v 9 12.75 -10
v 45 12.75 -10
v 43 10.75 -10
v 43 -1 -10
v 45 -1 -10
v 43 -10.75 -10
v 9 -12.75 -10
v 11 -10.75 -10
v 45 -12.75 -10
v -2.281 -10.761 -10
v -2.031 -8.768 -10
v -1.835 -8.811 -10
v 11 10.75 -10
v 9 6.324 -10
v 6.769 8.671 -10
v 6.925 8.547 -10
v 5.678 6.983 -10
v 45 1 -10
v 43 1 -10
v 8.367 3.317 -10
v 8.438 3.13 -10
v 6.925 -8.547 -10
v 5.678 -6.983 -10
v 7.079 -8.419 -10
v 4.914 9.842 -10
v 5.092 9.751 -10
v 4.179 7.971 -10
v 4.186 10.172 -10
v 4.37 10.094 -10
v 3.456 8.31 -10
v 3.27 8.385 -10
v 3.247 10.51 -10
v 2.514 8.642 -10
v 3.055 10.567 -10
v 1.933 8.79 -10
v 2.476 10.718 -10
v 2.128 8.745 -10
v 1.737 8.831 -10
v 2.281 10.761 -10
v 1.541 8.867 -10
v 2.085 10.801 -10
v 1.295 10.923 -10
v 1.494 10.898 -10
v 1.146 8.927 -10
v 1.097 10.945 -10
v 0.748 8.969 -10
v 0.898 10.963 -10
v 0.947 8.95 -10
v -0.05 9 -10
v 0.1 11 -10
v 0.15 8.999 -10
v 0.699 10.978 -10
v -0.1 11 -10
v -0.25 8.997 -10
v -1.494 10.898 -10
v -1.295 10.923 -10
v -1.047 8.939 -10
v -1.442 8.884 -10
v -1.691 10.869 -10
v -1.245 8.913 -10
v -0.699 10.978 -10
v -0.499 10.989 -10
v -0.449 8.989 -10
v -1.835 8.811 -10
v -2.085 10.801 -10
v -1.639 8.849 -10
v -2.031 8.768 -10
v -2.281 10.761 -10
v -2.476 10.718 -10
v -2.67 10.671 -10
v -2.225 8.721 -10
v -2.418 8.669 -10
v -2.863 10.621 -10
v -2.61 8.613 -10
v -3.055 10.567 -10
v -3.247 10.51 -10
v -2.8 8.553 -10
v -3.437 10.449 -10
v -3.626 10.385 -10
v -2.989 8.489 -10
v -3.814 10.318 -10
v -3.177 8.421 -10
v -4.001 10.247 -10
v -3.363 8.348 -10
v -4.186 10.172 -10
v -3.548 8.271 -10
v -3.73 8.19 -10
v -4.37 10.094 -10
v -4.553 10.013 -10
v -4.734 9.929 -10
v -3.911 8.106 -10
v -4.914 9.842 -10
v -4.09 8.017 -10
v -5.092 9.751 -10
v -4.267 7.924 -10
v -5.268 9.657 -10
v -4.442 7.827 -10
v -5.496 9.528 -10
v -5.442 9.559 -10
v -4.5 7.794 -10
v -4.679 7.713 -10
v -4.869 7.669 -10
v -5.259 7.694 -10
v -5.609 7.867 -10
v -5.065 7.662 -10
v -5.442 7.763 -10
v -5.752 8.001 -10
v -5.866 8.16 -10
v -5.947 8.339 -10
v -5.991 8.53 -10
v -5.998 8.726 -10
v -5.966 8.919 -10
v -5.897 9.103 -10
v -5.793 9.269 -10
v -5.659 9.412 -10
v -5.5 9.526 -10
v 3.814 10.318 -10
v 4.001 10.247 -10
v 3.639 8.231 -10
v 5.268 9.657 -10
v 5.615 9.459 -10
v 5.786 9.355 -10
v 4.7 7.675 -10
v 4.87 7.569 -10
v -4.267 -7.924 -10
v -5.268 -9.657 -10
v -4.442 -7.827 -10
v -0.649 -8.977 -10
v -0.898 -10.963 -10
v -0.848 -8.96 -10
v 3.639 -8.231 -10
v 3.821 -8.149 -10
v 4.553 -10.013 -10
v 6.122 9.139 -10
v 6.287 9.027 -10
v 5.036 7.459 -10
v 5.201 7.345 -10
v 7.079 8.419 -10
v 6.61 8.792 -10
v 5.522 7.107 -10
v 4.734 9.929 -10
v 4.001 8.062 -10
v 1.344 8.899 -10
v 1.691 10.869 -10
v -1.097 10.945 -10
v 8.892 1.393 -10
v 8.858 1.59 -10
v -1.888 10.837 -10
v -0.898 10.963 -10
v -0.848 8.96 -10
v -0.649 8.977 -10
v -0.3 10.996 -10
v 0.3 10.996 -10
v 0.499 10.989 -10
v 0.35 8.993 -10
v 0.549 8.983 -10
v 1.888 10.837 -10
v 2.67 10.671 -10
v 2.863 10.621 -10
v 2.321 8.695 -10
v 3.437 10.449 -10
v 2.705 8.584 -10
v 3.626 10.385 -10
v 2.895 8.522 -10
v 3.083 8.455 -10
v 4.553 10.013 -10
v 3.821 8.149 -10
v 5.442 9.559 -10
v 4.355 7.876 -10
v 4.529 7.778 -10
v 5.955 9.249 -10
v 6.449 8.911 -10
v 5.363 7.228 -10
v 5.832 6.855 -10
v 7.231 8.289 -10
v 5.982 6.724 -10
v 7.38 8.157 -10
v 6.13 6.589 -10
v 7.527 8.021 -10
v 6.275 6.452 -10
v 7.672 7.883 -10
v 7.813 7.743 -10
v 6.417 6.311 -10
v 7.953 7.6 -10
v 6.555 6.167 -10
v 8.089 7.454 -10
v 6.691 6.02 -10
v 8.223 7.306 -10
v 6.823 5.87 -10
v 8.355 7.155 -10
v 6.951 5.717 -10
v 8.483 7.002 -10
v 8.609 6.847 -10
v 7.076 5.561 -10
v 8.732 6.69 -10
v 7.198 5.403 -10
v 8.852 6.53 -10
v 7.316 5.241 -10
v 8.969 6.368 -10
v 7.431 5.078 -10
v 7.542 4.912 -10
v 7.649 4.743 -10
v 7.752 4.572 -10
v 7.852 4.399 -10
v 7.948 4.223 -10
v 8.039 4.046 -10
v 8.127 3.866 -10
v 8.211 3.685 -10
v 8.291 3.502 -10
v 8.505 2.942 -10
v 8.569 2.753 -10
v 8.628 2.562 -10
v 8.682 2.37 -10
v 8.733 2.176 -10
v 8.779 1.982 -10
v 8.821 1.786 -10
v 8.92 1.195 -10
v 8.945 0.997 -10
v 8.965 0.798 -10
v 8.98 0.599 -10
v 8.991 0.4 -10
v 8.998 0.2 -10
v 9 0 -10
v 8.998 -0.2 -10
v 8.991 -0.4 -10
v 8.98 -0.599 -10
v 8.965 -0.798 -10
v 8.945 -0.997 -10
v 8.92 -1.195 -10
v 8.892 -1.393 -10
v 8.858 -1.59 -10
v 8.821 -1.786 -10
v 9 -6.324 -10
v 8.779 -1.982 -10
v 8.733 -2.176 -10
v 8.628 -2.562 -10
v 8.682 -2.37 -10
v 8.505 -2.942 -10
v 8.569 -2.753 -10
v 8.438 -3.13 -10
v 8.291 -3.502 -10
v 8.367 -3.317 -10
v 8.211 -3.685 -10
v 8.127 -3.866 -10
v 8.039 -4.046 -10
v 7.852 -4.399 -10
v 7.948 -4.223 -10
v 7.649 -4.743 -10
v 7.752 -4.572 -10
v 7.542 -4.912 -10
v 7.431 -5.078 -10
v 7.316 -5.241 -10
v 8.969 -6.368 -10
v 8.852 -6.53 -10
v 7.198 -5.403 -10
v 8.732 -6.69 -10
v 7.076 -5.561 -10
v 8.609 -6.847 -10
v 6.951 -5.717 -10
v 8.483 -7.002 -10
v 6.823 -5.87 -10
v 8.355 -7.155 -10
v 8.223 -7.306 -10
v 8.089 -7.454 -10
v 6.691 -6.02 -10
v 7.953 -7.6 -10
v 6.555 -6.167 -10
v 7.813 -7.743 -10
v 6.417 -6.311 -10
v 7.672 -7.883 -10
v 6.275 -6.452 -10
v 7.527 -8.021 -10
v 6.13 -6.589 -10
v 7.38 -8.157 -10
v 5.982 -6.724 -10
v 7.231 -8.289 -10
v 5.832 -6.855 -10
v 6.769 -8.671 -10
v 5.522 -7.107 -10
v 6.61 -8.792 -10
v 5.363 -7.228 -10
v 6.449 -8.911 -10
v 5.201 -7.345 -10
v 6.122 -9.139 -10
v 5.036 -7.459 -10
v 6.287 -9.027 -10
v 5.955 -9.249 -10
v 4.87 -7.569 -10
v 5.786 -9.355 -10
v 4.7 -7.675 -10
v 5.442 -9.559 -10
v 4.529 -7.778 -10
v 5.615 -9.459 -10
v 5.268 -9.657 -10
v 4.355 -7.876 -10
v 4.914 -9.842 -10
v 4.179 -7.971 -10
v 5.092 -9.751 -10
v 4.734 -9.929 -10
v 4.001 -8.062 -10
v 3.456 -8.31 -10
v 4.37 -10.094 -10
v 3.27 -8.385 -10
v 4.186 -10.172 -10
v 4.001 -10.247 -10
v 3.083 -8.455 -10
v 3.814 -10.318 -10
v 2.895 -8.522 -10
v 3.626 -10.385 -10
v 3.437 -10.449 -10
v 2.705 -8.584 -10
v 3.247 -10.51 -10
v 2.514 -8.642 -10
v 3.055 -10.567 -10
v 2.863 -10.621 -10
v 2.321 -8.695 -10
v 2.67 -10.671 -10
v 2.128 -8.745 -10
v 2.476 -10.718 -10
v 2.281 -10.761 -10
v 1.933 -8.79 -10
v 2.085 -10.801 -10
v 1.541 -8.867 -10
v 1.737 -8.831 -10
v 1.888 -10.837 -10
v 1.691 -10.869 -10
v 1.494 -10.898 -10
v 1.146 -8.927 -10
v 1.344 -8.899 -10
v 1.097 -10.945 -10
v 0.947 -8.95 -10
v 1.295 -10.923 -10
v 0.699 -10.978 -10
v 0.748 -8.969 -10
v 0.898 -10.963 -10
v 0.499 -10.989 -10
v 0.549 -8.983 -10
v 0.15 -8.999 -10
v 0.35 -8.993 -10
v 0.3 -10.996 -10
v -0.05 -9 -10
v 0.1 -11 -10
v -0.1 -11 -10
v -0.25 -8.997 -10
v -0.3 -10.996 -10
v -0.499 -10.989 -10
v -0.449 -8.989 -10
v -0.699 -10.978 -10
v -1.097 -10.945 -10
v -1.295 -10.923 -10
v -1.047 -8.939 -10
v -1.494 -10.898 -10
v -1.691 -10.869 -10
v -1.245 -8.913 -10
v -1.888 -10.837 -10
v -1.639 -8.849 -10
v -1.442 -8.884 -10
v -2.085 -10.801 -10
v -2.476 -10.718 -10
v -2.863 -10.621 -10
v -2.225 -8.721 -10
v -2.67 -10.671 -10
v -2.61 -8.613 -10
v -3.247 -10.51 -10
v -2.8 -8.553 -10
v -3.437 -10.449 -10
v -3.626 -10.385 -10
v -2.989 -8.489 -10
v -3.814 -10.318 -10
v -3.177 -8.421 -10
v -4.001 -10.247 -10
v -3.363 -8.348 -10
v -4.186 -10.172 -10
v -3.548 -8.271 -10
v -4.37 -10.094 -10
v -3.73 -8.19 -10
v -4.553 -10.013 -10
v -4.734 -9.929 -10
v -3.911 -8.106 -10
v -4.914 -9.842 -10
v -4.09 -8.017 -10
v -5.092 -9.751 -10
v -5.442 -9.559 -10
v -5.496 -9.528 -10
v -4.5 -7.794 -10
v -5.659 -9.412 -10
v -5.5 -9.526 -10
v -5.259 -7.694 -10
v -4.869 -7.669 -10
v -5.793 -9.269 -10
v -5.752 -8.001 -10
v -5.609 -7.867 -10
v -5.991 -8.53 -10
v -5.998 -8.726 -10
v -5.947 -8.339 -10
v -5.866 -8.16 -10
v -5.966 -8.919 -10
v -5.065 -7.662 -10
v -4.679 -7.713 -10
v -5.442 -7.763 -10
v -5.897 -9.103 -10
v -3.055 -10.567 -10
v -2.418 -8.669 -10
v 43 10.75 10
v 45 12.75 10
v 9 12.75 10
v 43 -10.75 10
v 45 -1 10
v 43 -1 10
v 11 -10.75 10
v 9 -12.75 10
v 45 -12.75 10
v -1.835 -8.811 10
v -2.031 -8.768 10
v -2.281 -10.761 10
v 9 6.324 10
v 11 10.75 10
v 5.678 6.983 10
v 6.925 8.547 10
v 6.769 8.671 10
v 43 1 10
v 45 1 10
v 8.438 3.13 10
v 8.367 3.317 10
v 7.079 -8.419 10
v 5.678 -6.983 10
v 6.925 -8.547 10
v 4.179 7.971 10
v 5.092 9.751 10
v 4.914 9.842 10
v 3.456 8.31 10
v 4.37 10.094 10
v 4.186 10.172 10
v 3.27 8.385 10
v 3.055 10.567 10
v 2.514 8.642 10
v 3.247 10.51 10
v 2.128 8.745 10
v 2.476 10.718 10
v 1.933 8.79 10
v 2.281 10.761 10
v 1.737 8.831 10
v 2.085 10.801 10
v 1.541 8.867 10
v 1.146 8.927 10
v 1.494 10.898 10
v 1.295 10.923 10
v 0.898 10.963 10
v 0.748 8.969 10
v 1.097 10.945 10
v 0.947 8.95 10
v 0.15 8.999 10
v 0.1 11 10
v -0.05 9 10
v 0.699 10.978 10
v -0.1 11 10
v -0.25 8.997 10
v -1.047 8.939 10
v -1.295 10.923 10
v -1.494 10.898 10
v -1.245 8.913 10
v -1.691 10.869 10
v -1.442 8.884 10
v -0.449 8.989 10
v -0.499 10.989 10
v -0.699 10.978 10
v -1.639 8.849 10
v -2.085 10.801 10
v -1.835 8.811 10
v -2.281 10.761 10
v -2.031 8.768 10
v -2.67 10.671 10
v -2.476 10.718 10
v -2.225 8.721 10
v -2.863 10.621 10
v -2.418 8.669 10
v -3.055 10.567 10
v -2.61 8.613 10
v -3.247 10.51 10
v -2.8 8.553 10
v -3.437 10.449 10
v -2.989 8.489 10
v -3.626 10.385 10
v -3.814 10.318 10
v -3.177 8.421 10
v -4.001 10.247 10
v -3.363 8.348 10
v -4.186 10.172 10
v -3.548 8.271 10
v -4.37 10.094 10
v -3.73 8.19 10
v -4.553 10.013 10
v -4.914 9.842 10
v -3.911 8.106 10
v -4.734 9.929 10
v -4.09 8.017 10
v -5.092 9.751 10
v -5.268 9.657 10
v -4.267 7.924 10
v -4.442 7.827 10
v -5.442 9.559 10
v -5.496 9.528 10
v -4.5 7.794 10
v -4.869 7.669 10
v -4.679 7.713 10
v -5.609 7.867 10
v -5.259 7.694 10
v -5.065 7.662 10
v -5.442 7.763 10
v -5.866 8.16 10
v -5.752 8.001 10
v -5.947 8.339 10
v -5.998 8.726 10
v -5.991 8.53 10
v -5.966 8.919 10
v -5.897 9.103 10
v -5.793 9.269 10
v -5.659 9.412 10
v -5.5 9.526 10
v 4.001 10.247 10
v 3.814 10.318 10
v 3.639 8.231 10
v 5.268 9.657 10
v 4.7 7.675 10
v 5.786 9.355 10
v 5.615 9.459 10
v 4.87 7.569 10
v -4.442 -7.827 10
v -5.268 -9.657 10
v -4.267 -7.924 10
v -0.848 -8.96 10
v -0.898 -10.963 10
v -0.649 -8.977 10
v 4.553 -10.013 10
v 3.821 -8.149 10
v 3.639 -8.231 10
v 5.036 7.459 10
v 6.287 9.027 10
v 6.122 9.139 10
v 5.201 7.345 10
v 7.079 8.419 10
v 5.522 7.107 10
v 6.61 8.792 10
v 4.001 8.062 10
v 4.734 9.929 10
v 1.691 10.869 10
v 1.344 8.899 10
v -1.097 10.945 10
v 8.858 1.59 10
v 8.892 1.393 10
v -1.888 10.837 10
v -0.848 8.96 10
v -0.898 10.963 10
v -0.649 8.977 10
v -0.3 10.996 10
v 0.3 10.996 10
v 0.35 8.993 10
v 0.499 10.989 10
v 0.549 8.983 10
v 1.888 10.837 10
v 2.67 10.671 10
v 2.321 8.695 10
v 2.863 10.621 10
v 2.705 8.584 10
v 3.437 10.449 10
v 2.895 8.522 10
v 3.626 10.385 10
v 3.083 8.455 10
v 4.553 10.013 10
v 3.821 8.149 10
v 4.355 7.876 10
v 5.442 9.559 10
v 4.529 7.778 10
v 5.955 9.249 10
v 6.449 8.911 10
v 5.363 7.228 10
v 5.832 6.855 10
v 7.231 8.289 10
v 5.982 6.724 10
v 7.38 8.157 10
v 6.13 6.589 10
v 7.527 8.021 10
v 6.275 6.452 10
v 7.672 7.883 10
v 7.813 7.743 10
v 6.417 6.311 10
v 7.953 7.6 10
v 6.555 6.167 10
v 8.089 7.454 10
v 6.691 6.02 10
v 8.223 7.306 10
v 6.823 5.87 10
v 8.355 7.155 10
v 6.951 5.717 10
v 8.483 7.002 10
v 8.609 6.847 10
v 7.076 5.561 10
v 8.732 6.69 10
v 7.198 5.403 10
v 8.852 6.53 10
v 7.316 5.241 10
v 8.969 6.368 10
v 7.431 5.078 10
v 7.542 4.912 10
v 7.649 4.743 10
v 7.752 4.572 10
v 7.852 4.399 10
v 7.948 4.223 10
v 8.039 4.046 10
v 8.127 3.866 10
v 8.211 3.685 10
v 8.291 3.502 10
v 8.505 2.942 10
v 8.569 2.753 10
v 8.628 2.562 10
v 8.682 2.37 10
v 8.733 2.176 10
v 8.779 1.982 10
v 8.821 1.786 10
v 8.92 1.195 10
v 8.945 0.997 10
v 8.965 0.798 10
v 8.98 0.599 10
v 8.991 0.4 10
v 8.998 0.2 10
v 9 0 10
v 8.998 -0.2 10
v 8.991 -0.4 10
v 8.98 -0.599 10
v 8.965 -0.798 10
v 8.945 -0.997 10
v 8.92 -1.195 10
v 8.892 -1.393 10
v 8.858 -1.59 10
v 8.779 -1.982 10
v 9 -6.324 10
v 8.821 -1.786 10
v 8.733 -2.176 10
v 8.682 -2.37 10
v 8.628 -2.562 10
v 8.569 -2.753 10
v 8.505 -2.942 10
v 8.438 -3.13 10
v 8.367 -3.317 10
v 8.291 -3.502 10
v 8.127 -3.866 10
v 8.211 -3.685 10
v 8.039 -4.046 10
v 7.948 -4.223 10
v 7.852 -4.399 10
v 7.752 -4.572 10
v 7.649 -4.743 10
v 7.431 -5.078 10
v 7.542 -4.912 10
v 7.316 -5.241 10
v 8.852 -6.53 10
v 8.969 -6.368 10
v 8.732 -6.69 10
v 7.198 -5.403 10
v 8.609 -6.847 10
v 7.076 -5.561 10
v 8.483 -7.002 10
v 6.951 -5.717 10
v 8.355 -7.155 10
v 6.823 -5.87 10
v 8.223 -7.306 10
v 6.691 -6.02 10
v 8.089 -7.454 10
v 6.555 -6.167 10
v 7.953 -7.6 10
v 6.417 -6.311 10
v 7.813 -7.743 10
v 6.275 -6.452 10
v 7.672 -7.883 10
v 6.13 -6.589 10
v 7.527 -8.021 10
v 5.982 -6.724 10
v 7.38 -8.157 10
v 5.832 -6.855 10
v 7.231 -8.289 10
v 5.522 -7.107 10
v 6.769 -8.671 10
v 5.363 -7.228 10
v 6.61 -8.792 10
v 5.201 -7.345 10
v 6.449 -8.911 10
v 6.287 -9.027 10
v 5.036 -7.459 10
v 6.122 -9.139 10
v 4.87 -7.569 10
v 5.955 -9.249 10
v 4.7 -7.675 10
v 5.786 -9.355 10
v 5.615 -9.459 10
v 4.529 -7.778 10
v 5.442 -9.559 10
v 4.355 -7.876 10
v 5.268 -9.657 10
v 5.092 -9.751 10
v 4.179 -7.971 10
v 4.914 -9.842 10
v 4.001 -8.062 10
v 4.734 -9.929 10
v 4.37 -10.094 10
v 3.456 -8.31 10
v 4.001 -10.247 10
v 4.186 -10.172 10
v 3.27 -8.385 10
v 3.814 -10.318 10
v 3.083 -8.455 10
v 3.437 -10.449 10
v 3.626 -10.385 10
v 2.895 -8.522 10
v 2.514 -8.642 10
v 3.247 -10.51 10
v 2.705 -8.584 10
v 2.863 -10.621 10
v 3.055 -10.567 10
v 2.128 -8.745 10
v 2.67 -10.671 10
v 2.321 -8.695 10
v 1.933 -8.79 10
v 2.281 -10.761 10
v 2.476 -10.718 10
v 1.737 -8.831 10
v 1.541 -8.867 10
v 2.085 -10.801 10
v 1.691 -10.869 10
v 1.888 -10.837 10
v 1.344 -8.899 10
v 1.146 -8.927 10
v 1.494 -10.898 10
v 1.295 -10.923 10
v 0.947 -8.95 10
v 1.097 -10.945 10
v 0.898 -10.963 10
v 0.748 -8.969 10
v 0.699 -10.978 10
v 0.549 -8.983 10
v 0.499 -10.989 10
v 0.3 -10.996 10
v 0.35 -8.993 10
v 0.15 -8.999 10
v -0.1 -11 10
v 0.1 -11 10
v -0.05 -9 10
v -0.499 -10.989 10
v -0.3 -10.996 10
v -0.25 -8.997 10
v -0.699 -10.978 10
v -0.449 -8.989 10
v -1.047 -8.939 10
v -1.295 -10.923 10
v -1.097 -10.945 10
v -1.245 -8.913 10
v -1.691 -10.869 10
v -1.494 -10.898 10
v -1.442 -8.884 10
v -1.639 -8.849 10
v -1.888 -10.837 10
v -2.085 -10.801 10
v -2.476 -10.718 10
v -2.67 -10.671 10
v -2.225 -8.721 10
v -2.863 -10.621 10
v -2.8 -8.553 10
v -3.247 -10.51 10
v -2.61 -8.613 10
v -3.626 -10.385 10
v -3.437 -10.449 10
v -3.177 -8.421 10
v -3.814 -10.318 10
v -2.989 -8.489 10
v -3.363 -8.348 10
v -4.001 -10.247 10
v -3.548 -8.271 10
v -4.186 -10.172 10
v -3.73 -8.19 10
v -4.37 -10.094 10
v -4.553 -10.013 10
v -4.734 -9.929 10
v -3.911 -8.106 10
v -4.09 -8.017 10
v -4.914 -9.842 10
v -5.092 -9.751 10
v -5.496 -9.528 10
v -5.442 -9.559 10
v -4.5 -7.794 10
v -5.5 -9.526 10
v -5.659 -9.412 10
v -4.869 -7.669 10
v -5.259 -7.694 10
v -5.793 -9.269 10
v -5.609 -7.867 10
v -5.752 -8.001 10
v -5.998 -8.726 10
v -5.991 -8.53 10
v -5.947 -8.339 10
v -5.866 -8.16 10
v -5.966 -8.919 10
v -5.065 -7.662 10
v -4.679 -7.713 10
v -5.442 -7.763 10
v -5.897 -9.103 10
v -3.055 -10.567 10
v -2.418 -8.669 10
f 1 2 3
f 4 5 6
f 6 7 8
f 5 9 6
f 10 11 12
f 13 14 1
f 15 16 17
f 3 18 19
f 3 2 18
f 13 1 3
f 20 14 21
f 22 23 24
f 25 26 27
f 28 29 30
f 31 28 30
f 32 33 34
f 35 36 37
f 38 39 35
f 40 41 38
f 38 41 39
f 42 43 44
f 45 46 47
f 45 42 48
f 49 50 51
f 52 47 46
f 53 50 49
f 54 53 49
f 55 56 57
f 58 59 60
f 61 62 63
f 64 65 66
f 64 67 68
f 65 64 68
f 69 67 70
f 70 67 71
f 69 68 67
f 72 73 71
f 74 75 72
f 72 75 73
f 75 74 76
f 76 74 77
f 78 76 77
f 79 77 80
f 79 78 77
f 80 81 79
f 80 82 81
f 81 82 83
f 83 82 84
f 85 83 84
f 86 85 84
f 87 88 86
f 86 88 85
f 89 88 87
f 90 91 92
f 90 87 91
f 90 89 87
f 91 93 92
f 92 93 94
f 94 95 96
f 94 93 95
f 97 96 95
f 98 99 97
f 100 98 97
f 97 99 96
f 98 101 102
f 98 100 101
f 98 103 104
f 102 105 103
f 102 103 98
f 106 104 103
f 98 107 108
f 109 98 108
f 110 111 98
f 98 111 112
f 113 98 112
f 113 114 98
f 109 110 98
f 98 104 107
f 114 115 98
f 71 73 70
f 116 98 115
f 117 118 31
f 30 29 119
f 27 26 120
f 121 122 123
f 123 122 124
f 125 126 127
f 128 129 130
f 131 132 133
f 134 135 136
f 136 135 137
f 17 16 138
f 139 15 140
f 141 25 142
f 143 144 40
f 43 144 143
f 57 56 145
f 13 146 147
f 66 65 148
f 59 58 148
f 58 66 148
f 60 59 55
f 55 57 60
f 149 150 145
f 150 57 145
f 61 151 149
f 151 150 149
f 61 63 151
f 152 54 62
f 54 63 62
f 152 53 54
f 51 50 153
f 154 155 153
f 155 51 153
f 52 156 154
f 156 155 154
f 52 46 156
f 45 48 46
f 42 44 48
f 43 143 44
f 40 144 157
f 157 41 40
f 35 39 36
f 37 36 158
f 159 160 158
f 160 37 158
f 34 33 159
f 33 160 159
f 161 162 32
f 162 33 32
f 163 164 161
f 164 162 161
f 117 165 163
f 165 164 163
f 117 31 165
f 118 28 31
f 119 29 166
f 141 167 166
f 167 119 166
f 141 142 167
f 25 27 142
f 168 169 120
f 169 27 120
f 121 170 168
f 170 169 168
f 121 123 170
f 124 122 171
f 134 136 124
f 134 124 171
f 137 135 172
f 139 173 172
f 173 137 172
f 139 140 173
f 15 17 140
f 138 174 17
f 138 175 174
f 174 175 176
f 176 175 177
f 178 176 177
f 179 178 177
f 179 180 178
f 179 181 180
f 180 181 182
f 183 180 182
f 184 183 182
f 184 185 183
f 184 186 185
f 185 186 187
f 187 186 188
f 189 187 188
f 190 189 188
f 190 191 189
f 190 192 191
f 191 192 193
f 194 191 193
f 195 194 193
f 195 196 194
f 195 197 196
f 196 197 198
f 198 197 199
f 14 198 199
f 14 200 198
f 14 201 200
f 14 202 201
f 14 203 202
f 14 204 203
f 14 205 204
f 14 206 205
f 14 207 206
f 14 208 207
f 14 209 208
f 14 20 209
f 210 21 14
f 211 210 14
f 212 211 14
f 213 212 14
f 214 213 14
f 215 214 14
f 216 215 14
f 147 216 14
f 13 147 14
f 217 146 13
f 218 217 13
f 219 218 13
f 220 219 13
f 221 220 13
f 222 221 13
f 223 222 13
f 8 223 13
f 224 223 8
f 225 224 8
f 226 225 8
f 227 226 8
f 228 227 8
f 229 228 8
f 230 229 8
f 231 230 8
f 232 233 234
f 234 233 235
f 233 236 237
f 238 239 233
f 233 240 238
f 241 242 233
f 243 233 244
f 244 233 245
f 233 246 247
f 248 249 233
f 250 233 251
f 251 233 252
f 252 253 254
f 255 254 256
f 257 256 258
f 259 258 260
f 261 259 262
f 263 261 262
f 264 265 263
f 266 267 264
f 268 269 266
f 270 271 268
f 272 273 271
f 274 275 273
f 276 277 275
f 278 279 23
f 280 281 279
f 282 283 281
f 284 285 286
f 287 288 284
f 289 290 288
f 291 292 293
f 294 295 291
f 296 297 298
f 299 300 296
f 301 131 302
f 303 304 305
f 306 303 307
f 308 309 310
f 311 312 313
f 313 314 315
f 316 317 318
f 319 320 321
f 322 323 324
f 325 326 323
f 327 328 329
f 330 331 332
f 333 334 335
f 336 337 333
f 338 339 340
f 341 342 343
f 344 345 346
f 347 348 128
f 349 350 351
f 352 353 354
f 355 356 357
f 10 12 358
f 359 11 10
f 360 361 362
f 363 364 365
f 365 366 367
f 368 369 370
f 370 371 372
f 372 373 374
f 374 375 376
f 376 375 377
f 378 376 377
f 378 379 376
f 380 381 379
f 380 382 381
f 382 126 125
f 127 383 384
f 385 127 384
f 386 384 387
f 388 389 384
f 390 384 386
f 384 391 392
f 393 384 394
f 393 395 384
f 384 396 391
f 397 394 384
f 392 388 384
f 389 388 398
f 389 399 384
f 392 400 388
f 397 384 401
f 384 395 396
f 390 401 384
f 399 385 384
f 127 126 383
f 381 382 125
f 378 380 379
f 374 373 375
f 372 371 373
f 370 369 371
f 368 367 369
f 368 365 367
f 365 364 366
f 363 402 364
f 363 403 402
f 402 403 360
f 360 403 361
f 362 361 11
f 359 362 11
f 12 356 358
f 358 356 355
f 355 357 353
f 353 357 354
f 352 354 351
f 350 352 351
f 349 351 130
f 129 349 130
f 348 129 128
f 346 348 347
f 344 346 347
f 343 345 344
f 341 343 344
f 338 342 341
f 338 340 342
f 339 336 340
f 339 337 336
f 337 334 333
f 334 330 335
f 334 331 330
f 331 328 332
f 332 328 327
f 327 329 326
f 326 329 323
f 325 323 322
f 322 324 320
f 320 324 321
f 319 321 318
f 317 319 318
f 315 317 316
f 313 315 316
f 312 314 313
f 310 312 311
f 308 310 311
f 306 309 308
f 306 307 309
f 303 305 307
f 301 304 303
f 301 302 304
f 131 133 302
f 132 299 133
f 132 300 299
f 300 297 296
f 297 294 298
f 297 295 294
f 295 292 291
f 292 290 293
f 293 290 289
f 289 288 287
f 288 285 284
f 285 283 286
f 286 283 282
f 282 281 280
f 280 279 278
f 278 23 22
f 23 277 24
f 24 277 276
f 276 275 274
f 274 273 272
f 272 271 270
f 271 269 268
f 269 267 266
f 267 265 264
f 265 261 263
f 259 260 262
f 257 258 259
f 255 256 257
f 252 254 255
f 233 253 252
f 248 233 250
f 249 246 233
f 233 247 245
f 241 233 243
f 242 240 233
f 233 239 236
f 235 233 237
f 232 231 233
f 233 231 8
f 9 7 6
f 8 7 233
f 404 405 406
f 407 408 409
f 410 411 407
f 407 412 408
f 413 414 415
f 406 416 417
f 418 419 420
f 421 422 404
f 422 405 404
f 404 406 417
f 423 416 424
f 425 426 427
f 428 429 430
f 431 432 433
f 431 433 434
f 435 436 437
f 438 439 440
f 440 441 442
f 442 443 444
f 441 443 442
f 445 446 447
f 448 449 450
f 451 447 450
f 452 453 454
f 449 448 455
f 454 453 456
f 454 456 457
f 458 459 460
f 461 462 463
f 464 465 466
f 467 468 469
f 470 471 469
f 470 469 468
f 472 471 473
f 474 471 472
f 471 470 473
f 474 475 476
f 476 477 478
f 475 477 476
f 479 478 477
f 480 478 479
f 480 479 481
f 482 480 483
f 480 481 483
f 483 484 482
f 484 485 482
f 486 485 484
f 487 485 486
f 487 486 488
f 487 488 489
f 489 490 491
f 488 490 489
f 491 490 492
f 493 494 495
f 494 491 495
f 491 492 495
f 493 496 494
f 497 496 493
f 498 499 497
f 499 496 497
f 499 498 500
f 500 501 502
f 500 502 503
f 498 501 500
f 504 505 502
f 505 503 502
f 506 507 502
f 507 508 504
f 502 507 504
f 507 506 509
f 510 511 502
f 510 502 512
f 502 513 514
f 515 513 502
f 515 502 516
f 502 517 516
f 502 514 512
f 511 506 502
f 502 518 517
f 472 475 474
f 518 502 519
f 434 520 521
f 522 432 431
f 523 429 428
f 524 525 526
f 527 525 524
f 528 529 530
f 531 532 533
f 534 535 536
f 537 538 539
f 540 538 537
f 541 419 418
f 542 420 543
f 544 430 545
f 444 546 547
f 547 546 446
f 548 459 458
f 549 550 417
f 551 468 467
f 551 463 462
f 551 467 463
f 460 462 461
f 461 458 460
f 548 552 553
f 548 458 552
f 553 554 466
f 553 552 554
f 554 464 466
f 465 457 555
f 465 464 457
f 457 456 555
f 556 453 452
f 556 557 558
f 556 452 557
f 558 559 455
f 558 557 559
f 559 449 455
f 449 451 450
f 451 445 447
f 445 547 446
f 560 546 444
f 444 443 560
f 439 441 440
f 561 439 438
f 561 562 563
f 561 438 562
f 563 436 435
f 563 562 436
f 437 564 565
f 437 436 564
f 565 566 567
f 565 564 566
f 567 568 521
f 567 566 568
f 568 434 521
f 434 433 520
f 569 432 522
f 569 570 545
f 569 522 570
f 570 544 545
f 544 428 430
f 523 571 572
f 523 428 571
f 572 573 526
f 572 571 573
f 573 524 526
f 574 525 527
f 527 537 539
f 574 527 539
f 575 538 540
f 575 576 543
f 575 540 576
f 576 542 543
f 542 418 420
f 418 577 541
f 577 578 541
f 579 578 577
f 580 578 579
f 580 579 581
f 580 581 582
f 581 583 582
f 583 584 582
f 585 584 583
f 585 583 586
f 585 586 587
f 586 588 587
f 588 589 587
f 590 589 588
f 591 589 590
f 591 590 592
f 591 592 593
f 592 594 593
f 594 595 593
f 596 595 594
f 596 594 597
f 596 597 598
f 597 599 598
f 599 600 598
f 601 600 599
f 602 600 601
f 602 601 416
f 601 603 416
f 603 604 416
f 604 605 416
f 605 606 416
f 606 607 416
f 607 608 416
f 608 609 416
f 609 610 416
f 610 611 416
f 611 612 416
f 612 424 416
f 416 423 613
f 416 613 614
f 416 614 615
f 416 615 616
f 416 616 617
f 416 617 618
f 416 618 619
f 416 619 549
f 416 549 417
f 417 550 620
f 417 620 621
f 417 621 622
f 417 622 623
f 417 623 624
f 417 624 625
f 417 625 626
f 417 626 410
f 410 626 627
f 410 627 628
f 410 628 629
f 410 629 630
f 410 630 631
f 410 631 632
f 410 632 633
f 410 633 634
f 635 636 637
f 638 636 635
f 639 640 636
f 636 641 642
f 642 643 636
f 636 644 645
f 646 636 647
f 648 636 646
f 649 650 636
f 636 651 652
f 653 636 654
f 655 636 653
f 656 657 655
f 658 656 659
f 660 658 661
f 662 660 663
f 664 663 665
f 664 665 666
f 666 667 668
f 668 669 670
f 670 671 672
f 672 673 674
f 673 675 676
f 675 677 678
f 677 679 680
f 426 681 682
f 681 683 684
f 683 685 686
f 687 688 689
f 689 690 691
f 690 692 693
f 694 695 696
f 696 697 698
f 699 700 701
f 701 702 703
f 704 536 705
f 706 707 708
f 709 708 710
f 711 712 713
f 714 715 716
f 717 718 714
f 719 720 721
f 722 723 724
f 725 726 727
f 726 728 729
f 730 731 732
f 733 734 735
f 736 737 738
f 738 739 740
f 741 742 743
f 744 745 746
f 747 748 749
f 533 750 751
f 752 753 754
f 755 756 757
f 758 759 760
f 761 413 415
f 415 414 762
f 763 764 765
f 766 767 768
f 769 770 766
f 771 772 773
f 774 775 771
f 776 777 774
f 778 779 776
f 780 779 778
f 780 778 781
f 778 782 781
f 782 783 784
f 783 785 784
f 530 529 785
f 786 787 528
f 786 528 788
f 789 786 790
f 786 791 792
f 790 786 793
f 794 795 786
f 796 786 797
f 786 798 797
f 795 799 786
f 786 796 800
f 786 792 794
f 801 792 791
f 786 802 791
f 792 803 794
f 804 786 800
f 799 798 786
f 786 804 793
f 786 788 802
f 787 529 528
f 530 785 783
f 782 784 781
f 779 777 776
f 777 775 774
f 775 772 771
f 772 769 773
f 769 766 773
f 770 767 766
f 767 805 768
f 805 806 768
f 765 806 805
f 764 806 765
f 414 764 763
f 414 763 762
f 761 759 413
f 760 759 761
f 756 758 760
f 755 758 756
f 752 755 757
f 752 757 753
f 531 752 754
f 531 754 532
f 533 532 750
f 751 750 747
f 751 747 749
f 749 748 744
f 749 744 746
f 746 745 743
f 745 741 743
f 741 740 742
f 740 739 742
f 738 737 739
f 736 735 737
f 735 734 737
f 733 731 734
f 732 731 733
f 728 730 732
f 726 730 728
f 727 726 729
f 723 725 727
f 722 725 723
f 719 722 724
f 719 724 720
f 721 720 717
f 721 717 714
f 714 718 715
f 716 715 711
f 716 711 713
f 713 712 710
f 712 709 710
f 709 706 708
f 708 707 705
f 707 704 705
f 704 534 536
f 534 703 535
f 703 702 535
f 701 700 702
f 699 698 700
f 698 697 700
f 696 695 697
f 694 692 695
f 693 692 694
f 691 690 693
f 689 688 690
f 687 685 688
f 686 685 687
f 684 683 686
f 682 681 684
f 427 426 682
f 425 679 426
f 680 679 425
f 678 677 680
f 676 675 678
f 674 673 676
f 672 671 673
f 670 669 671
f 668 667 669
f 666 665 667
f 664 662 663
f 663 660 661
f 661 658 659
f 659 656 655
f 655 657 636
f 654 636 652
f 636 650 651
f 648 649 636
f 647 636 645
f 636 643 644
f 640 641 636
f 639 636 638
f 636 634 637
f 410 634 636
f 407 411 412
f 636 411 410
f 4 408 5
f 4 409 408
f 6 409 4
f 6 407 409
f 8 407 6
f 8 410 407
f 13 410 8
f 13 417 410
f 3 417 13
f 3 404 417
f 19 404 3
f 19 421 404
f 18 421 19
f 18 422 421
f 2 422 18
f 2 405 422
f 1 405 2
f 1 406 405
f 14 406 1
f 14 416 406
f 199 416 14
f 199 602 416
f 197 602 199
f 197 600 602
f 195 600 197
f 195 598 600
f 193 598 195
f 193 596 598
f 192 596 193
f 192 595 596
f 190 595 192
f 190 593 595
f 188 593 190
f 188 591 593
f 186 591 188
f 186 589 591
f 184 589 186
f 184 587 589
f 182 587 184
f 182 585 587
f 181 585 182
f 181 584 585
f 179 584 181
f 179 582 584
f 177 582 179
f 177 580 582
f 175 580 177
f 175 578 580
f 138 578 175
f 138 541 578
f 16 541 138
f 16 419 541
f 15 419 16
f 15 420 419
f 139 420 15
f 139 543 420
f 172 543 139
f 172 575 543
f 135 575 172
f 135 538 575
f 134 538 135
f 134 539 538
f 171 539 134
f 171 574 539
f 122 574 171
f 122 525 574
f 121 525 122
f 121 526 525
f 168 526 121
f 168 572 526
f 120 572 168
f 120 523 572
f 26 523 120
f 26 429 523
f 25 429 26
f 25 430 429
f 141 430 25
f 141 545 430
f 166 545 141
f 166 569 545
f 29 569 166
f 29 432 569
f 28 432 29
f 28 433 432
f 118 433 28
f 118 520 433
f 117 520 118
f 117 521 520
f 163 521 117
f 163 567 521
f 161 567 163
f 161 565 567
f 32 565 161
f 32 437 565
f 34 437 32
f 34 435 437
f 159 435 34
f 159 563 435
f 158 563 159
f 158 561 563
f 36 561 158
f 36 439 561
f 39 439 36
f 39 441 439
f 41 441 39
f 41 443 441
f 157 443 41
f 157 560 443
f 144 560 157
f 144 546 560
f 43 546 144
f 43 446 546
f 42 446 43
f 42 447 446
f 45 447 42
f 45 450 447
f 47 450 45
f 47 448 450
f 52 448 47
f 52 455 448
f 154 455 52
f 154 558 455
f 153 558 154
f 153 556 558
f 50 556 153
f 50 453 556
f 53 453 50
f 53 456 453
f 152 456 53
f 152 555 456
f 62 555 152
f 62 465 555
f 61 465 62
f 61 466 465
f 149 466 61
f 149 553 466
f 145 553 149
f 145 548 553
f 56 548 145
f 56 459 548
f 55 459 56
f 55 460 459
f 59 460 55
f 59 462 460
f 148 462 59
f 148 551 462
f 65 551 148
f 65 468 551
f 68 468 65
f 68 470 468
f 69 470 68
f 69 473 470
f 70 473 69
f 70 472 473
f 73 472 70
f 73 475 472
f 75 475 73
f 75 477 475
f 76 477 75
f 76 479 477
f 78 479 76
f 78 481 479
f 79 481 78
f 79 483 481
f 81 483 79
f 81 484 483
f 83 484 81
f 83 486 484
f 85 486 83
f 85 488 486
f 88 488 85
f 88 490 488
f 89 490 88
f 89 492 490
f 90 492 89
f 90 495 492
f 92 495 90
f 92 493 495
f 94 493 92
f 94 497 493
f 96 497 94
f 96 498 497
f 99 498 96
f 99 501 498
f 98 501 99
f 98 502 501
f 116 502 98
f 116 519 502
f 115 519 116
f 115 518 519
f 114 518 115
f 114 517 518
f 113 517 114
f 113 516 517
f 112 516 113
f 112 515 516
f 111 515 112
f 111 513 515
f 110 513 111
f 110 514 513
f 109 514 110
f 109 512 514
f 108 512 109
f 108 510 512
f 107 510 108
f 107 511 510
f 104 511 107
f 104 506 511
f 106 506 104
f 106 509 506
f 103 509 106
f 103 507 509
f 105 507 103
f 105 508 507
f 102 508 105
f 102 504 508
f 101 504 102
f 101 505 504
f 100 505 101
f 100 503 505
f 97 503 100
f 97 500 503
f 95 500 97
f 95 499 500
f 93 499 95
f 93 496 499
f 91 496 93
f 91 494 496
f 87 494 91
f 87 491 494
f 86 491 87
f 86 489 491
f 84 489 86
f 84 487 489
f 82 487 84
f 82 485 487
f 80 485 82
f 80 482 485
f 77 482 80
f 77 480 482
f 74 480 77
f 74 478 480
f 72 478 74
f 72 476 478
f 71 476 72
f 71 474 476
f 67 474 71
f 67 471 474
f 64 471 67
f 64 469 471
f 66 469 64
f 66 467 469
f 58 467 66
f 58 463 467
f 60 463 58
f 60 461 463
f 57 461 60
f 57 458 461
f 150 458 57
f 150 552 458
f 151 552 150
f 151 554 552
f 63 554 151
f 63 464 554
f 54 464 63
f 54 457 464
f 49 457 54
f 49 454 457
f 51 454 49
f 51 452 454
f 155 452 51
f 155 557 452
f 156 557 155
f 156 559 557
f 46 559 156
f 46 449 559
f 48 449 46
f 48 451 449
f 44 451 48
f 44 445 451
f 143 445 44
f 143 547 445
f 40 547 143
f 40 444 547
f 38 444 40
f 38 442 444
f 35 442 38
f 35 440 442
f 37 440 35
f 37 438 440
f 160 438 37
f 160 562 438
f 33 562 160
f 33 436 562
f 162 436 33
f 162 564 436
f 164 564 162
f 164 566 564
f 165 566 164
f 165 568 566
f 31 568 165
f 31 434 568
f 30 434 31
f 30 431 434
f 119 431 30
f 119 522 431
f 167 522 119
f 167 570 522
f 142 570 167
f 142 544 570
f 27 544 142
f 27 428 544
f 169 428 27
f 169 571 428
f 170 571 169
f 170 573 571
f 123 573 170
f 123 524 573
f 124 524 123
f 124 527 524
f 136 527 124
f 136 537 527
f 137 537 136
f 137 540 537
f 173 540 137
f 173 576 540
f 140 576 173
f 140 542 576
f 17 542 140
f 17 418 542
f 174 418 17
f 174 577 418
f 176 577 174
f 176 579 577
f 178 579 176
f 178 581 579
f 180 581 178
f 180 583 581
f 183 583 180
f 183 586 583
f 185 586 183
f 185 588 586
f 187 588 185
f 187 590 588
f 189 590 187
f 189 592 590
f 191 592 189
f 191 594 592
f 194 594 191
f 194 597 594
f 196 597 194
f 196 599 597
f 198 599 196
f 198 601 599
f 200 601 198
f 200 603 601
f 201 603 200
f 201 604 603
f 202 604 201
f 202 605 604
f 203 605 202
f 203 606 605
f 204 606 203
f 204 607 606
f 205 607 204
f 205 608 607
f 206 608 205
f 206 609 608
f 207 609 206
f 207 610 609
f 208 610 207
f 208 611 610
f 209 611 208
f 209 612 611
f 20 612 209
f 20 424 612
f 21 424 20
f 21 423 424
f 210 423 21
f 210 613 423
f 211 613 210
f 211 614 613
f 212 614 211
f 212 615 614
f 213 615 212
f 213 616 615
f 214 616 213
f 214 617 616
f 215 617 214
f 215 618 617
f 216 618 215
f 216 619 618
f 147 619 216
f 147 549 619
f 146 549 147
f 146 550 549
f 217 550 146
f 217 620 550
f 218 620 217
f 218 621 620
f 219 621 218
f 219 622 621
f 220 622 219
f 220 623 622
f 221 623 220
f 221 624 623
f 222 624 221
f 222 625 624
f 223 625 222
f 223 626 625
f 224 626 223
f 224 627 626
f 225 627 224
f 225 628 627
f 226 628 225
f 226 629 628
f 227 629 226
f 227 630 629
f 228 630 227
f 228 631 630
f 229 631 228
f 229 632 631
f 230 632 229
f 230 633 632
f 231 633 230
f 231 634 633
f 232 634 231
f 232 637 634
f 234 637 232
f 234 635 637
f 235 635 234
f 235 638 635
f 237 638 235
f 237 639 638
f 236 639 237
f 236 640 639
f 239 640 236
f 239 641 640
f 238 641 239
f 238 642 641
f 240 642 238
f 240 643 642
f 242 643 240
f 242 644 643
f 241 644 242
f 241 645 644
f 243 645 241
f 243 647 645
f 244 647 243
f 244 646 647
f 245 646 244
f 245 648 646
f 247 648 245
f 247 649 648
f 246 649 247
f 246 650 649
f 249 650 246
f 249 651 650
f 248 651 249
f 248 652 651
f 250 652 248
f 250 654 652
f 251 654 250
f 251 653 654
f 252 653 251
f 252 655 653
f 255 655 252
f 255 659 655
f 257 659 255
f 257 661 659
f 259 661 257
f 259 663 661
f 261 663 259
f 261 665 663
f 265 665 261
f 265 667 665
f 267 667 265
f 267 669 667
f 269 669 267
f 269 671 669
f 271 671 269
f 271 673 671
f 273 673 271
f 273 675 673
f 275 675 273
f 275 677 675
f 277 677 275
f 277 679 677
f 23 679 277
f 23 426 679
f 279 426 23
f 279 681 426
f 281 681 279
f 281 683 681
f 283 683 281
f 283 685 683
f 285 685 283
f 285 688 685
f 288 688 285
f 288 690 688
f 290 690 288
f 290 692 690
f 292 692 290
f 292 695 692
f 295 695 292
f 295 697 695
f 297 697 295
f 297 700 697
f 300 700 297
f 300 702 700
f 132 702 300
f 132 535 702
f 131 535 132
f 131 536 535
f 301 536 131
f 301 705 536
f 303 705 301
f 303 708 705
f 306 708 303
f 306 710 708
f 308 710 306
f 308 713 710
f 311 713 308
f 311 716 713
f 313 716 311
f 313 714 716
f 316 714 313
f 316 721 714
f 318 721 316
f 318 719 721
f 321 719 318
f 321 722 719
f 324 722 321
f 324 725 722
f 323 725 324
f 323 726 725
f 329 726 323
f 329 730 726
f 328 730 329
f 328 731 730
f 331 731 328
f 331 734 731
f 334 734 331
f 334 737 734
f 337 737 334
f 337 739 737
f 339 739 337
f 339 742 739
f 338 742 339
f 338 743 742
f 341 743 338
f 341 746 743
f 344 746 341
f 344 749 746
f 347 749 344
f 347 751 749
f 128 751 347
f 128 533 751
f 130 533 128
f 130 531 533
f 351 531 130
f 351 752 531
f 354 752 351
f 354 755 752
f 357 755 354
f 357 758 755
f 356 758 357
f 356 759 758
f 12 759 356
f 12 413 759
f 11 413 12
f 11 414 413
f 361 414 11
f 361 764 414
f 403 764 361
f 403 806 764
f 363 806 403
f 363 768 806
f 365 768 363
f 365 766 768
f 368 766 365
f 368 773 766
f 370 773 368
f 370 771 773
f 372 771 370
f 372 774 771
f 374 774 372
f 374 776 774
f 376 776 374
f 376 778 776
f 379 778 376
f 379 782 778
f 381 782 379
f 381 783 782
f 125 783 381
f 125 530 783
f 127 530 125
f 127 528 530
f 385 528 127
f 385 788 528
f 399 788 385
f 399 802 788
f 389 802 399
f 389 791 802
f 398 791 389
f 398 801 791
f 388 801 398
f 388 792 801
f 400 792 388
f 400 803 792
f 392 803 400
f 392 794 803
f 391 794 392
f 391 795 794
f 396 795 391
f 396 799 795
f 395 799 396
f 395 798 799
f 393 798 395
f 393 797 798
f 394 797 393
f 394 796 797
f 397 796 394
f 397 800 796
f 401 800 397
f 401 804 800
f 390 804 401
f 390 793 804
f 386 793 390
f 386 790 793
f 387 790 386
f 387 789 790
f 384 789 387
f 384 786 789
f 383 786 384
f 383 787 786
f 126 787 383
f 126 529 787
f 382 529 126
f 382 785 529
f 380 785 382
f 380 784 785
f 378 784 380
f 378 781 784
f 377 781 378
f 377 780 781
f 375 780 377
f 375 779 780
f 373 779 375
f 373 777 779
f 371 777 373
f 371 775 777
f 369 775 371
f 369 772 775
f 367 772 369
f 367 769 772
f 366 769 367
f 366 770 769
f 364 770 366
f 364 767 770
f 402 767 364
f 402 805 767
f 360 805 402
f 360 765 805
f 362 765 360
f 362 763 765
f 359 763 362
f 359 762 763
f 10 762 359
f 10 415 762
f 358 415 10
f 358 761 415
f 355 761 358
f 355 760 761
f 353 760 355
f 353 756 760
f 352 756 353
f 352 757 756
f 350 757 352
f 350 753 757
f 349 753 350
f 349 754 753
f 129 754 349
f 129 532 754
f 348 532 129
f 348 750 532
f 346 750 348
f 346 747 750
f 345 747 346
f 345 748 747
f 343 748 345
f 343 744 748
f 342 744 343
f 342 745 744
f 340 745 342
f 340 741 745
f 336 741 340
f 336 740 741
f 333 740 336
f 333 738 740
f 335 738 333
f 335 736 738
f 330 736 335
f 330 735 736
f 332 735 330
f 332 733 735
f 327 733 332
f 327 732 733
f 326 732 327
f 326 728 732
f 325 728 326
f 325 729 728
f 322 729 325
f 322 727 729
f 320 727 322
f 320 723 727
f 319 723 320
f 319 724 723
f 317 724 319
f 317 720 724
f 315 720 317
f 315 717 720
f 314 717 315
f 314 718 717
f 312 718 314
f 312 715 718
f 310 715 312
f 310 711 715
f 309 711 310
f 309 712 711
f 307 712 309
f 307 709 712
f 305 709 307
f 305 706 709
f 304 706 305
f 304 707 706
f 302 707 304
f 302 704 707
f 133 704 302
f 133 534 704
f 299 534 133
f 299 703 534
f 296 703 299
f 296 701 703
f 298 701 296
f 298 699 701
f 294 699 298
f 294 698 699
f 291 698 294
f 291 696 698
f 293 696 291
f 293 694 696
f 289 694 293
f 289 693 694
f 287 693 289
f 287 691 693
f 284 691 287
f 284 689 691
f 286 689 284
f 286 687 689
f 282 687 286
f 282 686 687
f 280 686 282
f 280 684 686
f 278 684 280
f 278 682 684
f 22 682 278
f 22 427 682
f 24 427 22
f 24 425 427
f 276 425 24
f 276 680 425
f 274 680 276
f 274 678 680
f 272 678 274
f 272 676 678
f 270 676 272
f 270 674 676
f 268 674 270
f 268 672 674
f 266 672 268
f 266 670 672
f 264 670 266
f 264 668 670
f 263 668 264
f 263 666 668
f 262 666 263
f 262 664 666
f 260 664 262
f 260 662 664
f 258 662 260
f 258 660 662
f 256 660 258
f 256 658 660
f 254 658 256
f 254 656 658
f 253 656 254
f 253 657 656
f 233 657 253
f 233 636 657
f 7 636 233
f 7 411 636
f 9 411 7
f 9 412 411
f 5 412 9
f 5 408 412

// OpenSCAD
th = 2;
tube = 18;
width = 20;
clipheight = 21.5;
clipdep = 32;
snap = (clipheight-th)/2;

// minimum angle for a fragment
$fa=1;
// minimum size of a fragment
$fs=0.2;

linear_extrude(width, center=true) {
    polygon([
        [tube/2             , clipheight/2+th  ],
        [tube/2             ,-clipheight/2-th  ],
        [tube/2+clipdep+2*th,-clipheight/2-th  ],
        [tube/2+clipdep+2*th,-clipheight/2+snap],
        [tube/2+clipdep+  th,-clipheight/2+snap],
        [tube/2+clipdep+  th,-clipheight/2     ],
        [tube/2+          th,-clipheight/2     ],
        [tube/2+          th, clipheight/2     ],
        [tube/2+clipdep+  th, clipheight/2     ],
        [tube/2+clipdep+  th, clipheight/2-snap],
        [tube/2+clipdep+2*th, clipheight/2-snap],
        [tube/2+clipdep+2*th, clipheight/2+th  ],
    ]);
    for(i=[-120,120])
        rotate([0,0,i])
            translate([tube/2 + th/2,0])
                circle(d=th);
    difference() {
        circle(d=tube+2*th);
        circle(d=tube);
        translate([-tube/2-2*th,0])
            circle(d=tube+4*th, $fn=6);
    }
}

%cylinder(2*width, d=tube, center=true);
